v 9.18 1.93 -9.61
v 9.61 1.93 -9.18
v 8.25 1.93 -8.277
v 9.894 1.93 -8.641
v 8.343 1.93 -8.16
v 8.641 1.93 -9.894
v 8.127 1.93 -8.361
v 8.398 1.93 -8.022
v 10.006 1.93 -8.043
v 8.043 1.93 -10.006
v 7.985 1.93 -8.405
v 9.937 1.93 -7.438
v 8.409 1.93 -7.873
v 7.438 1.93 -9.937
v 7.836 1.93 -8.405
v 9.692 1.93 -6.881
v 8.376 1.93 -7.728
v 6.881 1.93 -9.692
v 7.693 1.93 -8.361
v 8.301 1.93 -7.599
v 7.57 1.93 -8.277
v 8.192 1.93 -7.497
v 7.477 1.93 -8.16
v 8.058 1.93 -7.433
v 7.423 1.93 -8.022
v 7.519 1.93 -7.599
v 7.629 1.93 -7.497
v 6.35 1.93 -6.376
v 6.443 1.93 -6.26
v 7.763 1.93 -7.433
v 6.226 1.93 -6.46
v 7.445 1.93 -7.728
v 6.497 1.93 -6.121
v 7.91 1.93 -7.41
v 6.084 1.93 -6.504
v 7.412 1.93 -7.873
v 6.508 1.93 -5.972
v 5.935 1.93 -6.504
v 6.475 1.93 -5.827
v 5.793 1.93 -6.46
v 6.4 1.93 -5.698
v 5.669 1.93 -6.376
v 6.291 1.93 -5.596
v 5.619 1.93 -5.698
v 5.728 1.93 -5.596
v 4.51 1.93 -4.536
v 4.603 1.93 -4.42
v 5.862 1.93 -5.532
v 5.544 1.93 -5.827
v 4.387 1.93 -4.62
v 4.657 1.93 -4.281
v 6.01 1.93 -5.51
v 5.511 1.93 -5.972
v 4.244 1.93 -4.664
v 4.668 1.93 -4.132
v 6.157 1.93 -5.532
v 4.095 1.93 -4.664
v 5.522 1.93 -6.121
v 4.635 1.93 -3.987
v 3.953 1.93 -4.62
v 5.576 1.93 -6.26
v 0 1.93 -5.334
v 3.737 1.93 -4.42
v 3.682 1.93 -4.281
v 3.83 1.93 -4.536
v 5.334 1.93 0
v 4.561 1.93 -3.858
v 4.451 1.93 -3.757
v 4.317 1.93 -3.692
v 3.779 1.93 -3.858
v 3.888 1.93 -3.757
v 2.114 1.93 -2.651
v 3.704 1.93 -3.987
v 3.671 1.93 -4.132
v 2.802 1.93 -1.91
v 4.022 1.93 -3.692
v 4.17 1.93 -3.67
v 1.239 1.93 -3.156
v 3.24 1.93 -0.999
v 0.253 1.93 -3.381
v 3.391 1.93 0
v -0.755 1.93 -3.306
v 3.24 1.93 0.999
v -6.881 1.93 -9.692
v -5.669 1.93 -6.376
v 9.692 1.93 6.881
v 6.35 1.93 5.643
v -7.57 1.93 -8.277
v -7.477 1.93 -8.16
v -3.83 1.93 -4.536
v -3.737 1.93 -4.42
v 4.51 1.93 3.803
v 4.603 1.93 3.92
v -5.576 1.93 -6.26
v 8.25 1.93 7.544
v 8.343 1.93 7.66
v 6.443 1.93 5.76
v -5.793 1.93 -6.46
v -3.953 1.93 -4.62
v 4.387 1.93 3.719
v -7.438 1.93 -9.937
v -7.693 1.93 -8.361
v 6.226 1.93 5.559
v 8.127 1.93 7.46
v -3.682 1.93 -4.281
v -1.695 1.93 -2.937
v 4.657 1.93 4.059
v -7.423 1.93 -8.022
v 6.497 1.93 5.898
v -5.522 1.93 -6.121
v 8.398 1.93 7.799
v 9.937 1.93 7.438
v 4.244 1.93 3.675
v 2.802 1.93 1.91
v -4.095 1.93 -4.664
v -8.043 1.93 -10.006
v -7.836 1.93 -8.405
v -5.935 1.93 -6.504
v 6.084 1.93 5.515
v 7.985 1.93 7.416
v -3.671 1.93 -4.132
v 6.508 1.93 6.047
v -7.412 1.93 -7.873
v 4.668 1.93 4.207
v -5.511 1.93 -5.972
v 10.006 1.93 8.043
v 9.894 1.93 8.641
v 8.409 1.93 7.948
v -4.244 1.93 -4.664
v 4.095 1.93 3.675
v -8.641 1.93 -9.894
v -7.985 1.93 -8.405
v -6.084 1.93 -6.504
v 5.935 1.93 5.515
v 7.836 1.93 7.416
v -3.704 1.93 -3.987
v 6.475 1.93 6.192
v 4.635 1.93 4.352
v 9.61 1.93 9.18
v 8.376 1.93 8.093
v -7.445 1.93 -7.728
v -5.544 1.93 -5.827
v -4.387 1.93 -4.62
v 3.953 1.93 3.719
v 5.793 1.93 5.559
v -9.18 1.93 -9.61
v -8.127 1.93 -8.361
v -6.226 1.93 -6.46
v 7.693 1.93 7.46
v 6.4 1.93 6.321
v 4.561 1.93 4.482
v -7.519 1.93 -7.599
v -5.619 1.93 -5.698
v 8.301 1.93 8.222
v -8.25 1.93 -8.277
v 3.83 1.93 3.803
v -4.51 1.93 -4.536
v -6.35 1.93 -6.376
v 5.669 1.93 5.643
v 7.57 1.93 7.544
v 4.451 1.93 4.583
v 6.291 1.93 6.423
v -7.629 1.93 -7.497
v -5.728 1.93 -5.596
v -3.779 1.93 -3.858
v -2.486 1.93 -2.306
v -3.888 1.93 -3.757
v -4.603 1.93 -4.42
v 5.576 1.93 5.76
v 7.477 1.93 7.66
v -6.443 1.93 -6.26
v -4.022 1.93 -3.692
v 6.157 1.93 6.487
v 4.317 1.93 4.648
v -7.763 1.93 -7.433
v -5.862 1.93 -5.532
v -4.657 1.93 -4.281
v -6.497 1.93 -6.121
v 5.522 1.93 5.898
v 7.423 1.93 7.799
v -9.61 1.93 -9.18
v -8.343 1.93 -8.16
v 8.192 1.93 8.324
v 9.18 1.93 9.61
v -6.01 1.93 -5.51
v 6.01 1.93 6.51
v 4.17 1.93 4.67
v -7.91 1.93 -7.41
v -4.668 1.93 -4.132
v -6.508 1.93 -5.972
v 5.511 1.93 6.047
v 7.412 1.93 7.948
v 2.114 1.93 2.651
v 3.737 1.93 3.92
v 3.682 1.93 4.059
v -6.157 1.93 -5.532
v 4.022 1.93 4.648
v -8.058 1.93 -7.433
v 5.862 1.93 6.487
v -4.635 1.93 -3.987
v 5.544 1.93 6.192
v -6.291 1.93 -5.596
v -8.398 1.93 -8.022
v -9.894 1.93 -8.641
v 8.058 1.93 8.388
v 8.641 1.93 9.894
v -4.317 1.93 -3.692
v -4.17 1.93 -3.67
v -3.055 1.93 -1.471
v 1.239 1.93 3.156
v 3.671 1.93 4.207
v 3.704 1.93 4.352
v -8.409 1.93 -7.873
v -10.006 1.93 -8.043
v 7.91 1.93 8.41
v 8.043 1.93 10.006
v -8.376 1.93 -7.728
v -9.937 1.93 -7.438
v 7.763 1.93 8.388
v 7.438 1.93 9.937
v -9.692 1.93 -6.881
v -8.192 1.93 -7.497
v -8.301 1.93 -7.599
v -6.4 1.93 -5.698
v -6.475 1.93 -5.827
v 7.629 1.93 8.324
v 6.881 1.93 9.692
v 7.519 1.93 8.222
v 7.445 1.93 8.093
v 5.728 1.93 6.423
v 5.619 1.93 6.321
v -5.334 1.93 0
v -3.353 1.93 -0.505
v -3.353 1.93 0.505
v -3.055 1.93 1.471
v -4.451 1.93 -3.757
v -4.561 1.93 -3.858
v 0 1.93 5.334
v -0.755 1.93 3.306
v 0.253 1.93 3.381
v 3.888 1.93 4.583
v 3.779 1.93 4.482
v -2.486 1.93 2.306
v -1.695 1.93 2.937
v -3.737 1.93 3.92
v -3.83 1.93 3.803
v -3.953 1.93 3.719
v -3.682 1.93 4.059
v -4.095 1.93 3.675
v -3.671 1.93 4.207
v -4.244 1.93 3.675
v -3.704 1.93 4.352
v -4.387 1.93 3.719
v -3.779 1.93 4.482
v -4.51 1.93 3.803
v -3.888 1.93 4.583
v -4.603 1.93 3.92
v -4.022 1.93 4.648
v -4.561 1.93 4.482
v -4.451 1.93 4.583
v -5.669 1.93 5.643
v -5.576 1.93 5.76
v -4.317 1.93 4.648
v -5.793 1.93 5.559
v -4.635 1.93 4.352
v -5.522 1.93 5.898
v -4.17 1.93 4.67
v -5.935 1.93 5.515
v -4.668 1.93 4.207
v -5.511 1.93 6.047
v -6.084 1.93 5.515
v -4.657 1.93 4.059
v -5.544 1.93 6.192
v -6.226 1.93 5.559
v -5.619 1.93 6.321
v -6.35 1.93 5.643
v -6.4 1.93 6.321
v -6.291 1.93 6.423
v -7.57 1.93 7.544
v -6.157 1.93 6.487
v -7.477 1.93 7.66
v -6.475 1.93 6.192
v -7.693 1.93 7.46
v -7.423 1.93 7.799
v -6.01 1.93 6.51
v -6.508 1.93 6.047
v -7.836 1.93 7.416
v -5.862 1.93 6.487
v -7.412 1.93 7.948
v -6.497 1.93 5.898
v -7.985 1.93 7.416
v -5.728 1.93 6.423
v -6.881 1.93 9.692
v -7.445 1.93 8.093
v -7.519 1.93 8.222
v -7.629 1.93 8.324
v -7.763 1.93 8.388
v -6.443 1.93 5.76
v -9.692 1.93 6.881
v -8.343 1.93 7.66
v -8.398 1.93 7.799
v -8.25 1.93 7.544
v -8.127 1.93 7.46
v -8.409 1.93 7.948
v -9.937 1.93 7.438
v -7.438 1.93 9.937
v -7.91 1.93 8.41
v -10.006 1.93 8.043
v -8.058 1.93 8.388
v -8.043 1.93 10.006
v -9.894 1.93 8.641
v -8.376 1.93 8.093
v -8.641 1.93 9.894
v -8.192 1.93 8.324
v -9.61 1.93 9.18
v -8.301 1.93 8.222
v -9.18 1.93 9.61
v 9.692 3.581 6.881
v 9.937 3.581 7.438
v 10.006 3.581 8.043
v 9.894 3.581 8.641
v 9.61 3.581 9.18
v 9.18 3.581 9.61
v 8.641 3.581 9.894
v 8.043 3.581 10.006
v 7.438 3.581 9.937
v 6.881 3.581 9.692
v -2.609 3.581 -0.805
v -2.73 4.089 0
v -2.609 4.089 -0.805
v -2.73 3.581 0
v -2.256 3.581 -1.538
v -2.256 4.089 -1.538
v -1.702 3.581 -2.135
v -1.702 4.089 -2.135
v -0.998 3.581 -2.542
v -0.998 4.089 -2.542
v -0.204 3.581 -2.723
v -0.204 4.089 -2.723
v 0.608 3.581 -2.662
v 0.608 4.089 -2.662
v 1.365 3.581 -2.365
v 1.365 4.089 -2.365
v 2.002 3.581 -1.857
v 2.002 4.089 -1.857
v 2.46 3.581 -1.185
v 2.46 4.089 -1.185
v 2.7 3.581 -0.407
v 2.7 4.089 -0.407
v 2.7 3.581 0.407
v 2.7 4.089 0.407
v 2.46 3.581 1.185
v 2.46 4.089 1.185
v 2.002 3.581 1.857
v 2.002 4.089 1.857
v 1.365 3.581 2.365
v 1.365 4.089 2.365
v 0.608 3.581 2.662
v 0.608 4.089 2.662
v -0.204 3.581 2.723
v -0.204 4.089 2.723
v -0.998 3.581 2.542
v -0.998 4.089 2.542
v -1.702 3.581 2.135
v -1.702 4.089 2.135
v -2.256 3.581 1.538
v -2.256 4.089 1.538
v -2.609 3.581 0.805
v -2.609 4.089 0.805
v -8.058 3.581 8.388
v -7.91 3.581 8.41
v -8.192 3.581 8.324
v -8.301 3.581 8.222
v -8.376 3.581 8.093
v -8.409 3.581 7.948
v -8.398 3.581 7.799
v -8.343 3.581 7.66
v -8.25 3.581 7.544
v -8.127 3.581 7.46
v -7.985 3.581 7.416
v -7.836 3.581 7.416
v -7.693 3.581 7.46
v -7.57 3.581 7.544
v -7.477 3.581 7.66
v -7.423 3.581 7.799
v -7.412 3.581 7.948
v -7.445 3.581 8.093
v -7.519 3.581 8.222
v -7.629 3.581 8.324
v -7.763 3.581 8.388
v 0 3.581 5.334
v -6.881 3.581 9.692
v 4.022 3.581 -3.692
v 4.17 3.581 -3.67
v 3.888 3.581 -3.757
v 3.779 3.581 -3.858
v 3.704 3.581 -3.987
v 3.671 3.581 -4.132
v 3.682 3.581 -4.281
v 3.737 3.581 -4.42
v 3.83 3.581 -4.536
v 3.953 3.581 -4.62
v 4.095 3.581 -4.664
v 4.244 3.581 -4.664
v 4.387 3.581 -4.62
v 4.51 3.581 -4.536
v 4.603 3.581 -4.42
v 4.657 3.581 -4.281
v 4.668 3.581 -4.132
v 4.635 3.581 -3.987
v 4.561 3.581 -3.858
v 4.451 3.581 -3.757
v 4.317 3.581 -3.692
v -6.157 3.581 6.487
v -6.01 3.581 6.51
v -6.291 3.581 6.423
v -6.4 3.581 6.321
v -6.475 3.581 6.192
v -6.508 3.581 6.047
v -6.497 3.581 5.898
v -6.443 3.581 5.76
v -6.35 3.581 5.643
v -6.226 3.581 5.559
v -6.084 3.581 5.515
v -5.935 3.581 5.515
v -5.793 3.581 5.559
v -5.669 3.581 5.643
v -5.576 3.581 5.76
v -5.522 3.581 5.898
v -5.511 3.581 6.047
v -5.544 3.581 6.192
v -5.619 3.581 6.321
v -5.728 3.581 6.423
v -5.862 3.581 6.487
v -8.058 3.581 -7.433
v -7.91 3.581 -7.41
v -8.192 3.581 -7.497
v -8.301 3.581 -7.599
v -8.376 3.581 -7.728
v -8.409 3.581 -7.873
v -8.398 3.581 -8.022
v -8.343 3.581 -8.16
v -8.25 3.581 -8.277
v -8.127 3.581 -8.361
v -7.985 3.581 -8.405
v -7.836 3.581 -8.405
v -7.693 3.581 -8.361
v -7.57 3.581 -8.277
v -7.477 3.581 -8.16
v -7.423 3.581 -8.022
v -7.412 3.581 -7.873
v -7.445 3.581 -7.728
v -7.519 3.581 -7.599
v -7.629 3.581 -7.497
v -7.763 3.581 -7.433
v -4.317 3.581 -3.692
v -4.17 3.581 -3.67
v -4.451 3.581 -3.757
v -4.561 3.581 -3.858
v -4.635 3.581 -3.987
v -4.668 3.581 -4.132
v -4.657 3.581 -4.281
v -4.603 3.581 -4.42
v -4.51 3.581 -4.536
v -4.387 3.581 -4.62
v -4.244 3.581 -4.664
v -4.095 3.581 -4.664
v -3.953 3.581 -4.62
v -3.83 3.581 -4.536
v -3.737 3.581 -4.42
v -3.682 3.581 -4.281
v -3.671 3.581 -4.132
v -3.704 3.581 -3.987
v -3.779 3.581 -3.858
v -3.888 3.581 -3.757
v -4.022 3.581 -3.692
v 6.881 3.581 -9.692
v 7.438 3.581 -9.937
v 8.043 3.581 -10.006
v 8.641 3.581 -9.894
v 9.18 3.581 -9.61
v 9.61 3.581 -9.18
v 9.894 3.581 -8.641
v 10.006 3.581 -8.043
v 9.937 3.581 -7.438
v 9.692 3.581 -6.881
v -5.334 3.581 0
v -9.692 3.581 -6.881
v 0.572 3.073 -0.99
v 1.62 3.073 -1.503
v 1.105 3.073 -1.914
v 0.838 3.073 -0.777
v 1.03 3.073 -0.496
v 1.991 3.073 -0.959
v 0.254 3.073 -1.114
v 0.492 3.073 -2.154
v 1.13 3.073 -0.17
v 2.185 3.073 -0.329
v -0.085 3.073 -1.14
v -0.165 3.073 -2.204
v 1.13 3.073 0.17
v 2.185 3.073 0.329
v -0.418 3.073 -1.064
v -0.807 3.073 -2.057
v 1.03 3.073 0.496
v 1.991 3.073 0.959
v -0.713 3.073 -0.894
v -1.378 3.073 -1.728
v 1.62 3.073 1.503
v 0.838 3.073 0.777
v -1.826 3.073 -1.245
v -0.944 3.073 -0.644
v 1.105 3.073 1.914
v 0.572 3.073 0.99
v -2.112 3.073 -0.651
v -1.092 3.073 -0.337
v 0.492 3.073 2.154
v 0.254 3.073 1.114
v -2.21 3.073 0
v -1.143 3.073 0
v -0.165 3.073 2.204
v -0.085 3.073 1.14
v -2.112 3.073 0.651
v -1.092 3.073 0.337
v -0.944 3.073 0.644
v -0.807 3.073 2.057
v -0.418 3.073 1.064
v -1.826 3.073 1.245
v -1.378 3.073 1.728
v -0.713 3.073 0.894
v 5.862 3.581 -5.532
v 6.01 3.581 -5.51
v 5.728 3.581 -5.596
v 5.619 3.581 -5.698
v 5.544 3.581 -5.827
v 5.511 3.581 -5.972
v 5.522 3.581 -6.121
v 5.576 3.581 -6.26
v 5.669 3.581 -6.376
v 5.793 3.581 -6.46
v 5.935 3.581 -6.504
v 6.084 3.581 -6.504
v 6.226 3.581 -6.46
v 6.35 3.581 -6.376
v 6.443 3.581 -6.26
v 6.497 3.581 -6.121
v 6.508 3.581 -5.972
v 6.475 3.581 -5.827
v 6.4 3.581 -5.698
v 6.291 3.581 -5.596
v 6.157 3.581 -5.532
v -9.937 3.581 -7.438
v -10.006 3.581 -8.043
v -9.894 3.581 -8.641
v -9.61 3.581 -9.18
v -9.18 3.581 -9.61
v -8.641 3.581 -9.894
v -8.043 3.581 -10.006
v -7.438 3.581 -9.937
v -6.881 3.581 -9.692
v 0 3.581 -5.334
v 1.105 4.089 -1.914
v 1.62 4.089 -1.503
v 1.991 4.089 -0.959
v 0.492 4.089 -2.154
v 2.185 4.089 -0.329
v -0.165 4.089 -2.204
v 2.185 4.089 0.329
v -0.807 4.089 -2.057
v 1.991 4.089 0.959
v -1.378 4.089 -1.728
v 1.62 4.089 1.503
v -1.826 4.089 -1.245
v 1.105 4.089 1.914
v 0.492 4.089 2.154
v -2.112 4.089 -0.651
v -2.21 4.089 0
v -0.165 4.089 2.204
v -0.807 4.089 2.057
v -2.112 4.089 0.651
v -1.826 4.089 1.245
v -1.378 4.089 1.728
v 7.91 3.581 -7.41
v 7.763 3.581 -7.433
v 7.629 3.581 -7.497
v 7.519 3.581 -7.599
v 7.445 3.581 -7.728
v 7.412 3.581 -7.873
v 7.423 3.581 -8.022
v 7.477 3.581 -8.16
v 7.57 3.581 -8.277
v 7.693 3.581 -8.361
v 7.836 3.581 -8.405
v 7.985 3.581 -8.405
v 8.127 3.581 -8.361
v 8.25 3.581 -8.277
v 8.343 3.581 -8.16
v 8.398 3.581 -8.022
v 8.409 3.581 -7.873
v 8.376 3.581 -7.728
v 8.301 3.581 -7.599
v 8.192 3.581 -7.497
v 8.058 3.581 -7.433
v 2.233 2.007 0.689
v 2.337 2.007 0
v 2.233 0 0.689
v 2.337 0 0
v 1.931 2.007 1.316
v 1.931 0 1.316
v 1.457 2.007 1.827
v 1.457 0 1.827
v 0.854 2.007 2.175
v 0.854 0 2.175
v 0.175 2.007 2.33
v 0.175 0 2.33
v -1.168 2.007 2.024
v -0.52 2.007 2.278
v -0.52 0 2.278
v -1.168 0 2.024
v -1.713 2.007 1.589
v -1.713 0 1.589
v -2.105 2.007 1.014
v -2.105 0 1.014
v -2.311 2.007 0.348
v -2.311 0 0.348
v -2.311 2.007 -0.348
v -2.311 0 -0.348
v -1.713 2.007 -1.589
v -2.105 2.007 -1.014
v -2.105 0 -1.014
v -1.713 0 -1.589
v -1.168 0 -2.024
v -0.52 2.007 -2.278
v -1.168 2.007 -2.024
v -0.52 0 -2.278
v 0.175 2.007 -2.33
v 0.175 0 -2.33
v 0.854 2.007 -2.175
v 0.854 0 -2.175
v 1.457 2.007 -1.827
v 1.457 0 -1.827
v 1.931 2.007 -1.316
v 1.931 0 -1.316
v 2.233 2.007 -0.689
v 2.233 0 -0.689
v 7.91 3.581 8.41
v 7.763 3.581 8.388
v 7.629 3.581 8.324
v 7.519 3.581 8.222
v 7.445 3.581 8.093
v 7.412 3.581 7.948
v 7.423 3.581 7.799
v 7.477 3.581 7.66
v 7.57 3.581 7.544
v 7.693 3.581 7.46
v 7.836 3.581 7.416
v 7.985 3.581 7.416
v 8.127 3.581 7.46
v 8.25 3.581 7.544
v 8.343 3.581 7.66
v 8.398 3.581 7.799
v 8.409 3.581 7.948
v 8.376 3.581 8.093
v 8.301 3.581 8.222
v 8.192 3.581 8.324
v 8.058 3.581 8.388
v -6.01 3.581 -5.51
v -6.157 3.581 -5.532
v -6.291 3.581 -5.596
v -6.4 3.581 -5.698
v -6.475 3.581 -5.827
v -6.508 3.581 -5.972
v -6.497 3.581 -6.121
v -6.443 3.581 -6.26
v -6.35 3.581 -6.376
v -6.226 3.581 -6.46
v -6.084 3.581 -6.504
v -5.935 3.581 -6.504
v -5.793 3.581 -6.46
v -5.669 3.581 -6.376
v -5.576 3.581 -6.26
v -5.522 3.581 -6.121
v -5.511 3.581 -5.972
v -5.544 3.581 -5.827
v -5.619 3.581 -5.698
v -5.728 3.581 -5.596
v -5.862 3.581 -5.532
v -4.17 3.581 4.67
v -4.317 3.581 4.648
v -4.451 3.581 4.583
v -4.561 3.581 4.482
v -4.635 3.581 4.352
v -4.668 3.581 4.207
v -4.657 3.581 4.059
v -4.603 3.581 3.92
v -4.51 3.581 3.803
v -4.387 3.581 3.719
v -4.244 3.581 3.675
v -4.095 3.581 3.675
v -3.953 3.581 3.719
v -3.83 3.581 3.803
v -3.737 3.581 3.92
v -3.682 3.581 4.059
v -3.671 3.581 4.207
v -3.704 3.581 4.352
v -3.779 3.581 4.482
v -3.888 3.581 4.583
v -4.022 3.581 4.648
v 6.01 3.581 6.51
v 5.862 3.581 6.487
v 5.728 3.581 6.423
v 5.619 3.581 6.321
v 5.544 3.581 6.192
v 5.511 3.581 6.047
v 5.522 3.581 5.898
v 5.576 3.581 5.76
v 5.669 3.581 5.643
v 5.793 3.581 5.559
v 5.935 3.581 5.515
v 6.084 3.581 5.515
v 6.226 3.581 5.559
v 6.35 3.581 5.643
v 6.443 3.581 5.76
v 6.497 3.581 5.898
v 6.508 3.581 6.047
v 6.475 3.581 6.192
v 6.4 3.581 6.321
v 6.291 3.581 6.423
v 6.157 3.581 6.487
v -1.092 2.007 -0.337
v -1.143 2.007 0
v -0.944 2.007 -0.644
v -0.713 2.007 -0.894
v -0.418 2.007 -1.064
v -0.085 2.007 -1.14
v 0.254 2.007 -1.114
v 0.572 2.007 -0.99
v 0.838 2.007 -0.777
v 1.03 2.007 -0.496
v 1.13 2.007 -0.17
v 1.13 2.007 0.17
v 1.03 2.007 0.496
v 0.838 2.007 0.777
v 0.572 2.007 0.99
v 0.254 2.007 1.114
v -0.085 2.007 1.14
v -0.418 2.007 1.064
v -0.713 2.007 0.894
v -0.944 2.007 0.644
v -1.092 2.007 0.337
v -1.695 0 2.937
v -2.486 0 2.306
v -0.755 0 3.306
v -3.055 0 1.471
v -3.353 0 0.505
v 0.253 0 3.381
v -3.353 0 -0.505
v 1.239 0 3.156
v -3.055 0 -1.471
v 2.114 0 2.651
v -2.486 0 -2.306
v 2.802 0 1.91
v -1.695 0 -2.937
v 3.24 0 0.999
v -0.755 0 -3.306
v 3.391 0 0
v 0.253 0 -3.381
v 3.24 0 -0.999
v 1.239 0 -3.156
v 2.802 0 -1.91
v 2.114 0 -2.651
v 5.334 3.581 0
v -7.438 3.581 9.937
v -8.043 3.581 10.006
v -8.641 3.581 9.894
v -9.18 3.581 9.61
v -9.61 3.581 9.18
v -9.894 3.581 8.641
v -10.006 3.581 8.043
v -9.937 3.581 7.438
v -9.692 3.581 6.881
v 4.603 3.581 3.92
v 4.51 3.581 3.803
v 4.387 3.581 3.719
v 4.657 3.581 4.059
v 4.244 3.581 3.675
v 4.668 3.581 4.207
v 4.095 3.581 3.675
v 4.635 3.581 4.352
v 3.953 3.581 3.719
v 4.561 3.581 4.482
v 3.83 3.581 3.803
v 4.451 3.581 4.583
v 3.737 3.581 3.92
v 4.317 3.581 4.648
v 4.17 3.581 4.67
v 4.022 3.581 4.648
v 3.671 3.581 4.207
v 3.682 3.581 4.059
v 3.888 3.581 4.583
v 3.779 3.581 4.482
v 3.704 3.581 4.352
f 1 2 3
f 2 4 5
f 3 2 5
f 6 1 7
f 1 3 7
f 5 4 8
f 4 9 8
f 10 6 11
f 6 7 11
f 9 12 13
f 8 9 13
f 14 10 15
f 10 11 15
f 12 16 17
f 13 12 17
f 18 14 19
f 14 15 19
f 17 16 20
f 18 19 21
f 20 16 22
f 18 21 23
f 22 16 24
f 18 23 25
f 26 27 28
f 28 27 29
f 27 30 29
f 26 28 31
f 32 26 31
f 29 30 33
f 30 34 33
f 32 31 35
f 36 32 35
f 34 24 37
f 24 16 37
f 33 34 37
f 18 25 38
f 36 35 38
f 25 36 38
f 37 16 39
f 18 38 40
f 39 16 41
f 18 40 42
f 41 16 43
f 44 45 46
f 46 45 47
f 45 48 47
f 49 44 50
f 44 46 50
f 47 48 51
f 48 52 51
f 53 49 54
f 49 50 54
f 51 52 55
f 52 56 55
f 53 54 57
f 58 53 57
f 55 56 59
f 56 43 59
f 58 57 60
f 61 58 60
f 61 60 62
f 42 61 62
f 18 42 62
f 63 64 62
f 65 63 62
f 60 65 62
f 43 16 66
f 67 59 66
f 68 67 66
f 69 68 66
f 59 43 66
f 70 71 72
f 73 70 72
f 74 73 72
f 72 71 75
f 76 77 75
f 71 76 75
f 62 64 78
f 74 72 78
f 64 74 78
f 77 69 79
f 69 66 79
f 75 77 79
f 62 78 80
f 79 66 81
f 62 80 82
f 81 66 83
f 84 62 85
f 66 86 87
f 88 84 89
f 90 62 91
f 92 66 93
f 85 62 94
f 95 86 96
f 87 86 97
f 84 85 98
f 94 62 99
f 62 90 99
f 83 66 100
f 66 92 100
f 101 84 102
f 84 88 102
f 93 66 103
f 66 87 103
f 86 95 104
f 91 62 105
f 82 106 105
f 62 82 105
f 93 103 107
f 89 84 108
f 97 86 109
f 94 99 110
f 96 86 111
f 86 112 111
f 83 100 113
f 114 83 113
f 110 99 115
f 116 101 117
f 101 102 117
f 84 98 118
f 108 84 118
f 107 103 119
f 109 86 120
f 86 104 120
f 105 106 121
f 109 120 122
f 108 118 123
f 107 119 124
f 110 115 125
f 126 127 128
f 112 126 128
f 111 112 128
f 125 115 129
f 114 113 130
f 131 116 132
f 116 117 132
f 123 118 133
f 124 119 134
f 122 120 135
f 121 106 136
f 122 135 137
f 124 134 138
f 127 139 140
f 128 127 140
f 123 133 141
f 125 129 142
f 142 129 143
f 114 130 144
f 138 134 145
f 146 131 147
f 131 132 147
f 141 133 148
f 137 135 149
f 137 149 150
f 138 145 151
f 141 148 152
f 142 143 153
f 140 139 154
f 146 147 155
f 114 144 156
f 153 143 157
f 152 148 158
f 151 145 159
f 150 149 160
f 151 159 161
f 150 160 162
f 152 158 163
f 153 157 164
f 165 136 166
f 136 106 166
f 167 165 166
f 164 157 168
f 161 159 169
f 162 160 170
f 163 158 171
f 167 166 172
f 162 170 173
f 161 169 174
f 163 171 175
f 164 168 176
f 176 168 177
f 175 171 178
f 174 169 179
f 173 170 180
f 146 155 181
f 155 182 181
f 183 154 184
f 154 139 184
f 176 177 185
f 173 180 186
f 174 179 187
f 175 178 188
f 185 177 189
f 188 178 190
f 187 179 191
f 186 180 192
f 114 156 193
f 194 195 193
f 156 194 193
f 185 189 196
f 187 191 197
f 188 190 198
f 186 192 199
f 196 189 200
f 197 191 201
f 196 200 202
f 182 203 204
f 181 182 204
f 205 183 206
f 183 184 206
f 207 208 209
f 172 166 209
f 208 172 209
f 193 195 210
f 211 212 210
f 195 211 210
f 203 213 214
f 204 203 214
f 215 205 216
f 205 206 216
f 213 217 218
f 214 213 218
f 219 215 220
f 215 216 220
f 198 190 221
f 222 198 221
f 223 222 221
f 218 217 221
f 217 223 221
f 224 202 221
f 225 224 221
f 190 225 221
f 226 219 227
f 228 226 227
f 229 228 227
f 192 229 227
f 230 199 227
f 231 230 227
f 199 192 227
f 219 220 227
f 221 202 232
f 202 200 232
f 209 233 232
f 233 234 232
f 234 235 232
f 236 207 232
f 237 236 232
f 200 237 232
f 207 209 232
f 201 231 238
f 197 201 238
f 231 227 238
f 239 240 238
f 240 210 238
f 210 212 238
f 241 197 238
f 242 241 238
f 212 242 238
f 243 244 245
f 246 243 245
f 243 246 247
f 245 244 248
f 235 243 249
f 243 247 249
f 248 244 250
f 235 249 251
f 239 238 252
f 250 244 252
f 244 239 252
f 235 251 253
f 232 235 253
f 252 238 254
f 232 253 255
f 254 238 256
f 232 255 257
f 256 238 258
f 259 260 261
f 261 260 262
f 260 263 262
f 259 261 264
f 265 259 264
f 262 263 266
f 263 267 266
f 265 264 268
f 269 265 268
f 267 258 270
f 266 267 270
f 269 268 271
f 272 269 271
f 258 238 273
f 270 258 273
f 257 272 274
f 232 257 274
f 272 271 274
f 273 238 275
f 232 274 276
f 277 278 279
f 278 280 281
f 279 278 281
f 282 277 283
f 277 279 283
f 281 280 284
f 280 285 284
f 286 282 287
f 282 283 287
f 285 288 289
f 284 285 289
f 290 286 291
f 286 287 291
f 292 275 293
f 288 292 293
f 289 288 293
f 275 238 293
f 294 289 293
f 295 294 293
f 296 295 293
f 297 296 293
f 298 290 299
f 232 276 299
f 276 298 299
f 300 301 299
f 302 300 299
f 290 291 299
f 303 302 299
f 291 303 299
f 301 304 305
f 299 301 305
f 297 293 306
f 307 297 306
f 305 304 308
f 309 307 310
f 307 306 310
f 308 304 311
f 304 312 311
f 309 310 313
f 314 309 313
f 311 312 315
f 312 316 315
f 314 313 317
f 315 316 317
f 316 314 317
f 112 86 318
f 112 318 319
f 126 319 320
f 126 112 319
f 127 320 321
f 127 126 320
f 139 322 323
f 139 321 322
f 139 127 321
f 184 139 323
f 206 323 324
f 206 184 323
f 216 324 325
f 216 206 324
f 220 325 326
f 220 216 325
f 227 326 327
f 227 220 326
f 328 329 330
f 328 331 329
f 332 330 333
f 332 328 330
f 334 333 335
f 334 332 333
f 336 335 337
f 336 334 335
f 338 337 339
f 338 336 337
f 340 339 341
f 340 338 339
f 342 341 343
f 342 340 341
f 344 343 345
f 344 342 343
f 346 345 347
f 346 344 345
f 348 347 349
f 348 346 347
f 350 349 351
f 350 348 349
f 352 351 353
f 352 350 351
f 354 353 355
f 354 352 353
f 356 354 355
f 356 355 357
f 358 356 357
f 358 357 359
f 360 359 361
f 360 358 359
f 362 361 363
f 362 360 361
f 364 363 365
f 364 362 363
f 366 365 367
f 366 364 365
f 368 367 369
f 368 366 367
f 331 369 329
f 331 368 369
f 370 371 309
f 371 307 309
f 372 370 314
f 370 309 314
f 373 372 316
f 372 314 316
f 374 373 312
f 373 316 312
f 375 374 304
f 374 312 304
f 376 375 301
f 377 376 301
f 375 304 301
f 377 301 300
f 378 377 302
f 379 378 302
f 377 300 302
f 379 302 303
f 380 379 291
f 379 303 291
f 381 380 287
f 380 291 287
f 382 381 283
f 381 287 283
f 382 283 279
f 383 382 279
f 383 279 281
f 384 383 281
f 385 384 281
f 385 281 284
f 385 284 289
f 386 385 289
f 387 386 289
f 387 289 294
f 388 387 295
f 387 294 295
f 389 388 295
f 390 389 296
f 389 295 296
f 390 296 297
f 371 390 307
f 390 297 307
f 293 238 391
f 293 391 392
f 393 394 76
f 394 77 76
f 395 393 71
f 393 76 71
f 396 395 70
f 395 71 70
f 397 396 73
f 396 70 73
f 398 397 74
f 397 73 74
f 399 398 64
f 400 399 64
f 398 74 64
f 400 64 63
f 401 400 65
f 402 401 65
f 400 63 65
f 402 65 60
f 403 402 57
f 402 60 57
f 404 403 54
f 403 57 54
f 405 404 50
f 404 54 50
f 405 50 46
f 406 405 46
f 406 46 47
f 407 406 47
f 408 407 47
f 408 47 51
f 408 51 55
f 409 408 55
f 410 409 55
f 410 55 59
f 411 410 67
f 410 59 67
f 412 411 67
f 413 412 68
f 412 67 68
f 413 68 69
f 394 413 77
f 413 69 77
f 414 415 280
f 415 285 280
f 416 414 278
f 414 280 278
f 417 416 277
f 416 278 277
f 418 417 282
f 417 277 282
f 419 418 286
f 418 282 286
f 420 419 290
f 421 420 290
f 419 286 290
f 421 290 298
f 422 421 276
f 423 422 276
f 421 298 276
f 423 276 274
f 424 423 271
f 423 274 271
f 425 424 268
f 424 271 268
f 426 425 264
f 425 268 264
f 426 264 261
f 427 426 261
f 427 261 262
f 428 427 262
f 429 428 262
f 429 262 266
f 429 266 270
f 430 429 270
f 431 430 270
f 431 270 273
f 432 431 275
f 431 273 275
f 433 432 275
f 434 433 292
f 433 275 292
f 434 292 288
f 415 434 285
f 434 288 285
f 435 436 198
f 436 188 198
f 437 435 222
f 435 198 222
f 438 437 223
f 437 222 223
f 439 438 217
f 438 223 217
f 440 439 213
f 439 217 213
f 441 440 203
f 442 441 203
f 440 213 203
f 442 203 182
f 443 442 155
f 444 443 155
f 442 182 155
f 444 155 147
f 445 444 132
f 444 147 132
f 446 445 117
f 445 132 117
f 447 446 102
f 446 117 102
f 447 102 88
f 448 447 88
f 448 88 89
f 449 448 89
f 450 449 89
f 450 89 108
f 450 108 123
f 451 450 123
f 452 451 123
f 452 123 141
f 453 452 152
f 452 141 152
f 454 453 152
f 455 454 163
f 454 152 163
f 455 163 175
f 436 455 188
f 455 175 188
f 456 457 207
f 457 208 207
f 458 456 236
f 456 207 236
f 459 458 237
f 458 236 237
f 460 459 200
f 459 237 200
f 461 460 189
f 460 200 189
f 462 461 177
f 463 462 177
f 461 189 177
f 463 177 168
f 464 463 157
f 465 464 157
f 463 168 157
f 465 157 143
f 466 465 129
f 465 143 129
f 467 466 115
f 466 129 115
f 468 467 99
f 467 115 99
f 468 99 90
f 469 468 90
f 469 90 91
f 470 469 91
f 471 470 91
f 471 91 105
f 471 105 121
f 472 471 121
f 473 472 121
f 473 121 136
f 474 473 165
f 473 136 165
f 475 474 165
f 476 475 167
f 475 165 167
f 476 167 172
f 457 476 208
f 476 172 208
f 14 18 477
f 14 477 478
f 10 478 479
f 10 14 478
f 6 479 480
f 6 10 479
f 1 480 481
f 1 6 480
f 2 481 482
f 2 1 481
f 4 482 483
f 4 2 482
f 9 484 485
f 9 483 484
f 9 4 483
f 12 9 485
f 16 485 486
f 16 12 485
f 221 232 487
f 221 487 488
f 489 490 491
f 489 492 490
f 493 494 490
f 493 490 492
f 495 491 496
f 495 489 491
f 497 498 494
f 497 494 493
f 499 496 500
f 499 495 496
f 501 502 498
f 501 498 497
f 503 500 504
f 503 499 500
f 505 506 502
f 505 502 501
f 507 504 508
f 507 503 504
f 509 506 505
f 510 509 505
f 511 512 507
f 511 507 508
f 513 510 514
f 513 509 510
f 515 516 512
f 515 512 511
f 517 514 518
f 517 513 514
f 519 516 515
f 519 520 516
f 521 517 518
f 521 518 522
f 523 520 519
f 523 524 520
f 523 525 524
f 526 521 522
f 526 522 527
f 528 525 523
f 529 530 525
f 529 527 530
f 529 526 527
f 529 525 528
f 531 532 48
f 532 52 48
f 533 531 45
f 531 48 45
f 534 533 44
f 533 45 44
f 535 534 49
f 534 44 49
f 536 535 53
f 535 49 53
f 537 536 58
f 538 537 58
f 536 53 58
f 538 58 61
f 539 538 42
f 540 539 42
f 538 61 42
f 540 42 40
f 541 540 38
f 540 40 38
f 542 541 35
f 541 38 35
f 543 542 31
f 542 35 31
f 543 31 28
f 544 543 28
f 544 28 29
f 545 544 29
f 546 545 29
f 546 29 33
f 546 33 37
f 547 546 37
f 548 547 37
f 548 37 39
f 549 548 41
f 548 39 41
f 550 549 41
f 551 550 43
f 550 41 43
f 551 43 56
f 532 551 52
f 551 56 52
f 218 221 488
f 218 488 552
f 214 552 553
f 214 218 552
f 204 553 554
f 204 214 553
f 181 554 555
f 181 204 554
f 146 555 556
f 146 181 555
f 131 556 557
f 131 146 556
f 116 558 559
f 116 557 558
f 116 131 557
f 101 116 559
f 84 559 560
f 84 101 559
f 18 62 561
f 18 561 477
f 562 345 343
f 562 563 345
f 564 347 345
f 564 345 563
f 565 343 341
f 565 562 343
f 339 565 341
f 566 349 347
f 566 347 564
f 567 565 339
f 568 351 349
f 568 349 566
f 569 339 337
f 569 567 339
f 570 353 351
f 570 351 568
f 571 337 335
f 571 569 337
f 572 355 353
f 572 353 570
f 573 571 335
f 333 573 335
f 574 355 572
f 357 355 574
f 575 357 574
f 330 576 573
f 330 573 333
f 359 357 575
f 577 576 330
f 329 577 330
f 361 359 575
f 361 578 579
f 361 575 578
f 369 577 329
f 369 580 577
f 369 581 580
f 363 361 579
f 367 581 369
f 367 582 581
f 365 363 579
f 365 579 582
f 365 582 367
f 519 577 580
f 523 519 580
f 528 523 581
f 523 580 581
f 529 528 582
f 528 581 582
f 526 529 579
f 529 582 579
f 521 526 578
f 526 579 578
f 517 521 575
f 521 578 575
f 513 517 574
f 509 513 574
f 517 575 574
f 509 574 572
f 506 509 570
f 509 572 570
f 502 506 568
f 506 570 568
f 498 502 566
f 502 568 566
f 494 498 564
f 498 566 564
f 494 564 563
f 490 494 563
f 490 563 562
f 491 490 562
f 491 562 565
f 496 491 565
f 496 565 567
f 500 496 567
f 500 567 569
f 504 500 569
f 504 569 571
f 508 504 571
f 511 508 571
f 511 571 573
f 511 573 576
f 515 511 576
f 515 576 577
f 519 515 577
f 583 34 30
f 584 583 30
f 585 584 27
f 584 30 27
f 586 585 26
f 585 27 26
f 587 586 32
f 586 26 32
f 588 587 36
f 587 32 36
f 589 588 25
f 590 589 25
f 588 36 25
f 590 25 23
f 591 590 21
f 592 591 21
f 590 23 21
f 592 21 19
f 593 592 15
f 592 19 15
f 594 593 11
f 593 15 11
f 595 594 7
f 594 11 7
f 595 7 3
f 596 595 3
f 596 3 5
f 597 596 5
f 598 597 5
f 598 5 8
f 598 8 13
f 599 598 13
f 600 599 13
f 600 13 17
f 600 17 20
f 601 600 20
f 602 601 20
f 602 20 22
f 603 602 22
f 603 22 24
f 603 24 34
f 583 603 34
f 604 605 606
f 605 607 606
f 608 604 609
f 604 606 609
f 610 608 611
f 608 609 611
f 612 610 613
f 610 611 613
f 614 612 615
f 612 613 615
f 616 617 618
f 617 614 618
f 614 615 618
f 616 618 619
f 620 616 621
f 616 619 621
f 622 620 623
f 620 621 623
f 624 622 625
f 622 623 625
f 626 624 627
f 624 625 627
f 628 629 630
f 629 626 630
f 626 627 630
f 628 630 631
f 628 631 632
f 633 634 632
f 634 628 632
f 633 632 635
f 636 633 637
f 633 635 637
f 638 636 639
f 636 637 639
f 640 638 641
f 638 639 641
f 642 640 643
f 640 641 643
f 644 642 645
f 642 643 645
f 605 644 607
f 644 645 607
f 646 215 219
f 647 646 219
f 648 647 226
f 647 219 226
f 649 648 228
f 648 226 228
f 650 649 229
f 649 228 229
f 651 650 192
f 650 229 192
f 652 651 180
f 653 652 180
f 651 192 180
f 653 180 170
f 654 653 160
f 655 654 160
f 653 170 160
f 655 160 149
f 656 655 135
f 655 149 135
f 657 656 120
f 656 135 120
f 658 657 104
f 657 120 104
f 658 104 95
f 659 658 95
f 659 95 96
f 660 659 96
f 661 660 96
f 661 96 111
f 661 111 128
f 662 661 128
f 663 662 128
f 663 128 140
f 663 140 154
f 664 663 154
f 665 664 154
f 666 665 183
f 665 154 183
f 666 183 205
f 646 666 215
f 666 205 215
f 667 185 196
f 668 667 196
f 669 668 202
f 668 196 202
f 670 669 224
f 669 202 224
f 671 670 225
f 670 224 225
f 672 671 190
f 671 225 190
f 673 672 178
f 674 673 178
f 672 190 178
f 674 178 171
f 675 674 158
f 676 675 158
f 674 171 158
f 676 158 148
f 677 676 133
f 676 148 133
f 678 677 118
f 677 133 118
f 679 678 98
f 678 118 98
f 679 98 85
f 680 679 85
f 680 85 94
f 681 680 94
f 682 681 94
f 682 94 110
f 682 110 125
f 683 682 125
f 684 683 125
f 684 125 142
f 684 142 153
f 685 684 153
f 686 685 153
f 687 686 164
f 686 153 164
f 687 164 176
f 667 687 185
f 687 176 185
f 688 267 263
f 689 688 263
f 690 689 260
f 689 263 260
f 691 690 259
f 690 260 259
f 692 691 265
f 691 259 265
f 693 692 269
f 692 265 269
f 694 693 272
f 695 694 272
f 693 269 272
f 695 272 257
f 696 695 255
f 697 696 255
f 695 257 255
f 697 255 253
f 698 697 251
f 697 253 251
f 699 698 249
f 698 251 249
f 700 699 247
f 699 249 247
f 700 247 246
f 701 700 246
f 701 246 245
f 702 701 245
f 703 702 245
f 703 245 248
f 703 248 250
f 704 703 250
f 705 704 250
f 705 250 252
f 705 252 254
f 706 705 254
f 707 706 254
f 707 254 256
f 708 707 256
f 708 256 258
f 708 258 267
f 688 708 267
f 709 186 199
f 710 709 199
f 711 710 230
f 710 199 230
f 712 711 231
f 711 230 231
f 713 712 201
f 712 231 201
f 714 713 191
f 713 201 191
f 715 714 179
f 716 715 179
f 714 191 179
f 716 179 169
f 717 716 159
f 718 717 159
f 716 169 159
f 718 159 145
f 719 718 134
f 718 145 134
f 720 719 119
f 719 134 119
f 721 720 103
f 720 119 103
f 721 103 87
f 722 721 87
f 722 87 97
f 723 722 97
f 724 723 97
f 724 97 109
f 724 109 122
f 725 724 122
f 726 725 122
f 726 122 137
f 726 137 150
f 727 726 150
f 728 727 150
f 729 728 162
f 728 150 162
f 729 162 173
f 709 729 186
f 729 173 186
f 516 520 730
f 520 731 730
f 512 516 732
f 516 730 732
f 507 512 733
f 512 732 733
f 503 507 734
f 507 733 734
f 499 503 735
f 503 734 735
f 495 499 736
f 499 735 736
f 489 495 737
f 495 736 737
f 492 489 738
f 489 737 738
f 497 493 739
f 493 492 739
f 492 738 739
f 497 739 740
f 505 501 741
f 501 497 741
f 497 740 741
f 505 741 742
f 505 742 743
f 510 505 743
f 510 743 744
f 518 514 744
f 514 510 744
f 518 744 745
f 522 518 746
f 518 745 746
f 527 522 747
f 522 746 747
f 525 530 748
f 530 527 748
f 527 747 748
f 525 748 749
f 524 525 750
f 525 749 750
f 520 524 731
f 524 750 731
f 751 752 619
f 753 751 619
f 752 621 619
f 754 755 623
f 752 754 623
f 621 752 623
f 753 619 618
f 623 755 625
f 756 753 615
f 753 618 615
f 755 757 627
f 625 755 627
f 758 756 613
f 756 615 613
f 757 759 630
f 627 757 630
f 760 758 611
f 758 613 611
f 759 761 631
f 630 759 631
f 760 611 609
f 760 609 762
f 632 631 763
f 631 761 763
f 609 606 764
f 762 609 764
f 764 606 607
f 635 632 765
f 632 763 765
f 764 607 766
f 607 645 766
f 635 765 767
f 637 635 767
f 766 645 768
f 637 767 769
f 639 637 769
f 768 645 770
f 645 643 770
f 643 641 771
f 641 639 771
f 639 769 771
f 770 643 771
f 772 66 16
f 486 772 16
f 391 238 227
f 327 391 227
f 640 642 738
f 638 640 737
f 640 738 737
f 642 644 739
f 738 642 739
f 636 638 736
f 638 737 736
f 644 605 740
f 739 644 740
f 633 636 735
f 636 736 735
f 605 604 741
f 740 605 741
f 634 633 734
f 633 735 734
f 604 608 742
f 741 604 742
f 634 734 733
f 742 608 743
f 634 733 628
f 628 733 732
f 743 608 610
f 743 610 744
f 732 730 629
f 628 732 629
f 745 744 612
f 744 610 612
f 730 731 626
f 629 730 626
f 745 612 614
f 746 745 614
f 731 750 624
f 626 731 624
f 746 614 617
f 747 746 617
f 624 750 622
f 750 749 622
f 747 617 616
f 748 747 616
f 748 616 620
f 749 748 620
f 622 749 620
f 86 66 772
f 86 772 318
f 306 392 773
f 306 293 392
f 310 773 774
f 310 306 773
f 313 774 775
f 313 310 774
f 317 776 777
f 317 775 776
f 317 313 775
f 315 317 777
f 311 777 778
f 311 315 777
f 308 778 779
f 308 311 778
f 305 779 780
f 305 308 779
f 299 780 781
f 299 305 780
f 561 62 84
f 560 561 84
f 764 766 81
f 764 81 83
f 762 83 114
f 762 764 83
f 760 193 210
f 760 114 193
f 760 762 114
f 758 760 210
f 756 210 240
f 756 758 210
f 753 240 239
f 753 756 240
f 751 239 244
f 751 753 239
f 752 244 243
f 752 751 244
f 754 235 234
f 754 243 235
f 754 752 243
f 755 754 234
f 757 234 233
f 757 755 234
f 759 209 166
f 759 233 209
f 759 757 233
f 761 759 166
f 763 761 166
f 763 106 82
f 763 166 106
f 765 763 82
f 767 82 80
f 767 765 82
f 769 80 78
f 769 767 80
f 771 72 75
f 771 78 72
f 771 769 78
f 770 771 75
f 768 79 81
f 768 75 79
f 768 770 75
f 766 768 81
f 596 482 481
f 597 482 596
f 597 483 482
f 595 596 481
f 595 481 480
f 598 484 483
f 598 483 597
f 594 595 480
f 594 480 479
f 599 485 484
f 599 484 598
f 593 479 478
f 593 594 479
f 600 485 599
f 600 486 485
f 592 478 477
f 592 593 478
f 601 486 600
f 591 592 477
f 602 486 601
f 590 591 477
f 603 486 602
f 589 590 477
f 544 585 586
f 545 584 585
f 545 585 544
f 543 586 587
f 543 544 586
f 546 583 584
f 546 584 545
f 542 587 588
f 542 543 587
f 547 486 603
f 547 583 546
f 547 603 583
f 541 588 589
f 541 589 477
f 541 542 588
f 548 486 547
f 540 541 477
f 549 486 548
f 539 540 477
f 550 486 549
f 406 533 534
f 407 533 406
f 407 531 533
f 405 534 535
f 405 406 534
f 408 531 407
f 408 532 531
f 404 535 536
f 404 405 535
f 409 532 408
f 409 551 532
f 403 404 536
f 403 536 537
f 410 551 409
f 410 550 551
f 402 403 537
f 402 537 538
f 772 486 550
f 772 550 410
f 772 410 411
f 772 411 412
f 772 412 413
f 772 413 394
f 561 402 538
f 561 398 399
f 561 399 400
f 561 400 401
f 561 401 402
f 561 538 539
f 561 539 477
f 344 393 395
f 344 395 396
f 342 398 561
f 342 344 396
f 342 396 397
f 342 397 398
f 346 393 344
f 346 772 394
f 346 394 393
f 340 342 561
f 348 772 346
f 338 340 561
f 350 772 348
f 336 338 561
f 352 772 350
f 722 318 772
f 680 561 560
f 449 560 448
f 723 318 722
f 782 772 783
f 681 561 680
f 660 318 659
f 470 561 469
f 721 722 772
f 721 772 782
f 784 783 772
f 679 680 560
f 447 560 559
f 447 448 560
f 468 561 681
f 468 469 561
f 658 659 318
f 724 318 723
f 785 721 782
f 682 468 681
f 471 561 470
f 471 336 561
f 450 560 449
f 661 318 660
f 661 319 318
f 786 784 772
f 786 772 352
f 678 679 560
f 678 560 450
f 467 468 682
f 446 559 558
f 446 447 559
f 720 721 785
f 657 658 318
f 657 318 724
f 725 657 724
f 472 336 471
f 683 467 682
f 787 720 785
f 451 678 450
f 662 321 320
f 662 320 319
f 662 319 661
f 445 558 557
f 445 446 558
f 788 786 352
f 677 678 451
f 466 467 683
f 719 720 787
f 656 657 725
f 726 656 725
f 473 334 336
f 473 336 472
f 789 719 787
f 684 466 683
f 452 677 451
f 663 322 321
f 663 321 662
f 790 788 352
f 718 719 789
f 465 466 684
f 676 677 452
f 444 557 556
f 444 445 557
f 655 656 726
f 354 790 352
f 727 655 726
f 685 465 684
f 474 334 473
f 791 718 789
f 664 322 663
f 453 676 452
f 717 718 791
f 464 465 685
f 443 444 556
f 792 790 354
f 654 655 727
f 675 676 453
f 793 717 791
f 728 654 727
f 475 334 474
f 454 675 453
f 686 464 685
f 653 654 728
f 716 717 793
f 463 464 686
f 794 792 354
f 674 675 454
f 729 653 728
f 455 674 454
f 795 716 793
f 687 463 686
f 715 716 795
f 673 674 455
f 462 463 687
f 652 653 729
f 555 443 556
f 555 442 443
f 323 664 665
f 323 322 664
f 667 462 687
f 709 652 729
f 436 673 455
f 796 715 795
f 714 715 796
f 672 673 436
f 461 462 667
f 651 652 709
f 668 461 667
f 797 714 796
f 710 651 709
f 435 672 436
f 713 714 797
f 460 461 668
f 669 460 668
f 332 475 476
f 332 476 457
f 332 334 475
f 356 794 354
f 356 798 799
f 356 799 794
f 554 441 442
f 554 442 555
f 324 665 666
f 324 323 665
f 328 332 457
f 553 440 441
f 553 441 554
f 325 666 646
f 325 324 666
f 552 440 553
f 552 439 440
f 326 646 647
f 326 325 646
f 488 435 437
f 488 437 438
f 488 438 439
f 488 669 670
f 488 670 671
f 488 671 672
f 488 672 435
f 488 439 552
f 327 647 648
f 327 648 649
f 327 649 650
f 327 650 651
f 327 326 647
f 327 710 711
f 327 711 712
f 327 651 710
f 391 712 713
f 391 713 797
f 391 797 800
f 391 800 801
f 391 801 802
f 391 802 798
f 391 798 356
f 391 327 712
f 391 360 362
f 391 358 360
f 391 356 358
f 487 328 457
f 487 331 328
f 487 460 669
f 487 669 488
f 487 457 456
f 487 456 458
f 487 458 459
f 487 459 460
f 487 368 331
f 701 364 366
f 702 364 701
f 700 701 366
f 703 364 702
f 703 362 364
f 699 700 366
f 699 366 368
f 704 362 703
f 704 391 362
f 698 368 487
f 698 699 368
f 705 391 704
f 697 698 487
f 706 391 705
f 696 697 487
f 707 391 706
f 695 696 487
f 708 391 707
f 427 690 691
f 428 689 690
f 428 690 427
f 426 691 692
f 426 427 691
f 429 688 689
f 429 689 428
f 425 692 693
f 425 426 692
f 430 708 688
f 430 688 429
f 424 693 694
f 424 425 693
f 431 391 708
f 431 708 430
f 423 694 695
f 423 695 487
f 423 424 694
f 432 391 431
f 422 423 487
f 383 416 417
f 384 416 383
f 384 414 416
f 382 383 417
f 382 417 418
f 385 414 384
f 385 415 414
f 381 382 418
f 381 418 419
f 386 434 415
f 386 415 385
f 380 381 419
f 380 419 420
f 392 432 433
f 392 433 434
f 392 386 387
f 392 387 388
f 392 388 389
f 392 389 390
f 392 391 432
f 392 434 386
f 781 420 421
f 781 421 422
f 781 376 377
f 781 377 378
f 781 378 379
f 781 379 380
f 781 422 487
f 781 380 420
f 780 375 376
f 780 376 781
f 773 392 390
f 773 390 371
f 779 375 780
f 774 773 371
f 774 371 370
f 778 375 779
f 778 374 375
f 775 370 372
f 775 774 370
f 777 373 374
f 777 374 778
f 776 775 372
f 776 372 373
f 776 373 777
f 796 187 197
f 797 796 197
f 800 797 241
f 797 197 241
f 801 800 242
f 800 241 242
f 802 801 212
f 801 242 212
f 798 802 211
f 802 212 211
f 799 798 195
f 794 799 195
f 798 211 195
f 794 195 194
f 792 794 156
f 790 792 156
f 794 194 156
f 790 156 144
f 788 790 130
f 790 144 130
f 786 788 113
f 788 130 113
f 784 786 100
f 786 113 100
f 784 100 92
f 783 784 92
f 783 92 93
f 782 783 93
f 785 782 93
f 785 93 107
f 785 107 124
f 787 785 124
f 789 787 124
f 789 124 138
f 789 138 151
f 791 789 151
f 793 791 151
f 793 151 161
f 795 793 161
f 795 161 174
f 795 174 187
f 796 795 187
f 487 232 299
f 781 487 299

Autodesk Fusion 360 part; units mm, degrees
sketch "Sketch1" plane through (0, 0, 0) normal (0, 1, 0) x (1, 0, 0)
  circle A0 centre (0, 0) radius 3.3909
  circle A1 centre (0, 0) radius 2.3368
  dimension "d1" = 6.7818
  dimension "d2" = 4.6736
extrude "Extrude1" add sketch "Sketch1" along normal blind 1.9304
sketch "Sketch2" plane through (0, 1.9304, 0) normal (0, 1, 0) x (-1, 0, 0)
  circle A0 centre (0, 0) radius 2.3368
  circle A1 centre (0, 0) radius 3.3909
  line L0 (-10.0076, 10.0076) -> (10.0076, 10.0076) construction
  line L1 (10.0076, 10.0076) -> (10.0076, -10.0076) construction
  line L2 (10.0076, -10.0076) -> (-10.0076, -10.0076) construction
  line L3 (-10.0076, -10.0076) -> (-10.0076, 10.0076) construction
  line L4 (-10.0076, 10.0076) -> (10.0076, -10.0076) construction
  line L5 (10.0076, 10.0076) -> (-10.0076, -10.0076) construction
  circle A2 centre (7.9709, -7.9709) radius 2.0367 construction
  circle A3 centre (-7.9709, -7.9709) radius 2.0367 construction
  circle A4 centre (-7.9709, 7.9709) radius 2.0367 construction
  circle A5 centre (7.9709, 7.9709) radius 2.0367 construction
  circle A6 centre (0, 0) radius 5.334 construction
  circle A7 centre (7.9709, -7.9709) radius 0.5
  circle A8 centre (-7.9709, -7.9709) radius 0.5
  circle A9 centre (7.9709, 7.9709) radius 0.5
  circle A10 centre (-7.9709, 7.9709) radius 0.5
  line L6 (8.4709, -7.9709) -> (-8.4709, -7.9709) construction
  line L7 (0, -5.334) -> (0, 5.334) construction
  line L8 (5.334, 0) -> (-5.334, 0) construction
  line L9 (9.4111, -6.5307) -> (6.5307, -9.4111) construction
  line L10 (-6.5307, -9.4111) -> (-9.4111, -6.5307) construction
  line L11 (-9.4111, 6.5307) -> (-6.5307, 9.4111) construction
  line L12 (9.4111, 6.5307) -> (6.5307, 9.4111) construction
  line L13 (5.334, 0) -> (9.6916, -6.8813)
  line L14 (5.334, 0) -> (9.6916, 6.8813)
  line L15 (0, 5.334) -> (6.8813, 9.6916)
  line L16 (0, 5.334) -> (-6.8813, 9.6916)
  line L17 (-5.334, 0) -> (-9.6916, 6.8813)
  line L18 (-5.334, 0) -> (-9.6916, -6.8813)
  line L19 (0, -5.334) -> (-6.8813, -9.6916)
  line L20 (0, -5.334) -> (6.8813, -9.6916)
  arc A11 (6.8813, -9.6916) -> (9.6916, -6.8813) centre (7.9709, -7.9709) ccw
  arc A12 (-9.6916, -6.8813) -> (-6.8813, -9.6916) centre (-7.9709, -7.9709) ccw
  arc A13 (-6.8813, 9.6916) -> (-9.6916, 6.8813) centre (-7.9709, 7.9709) ccw
  arc A14 (9.6916, 6.8813) -> (6.8813, 9.6916) centre (7.9709, 7.9709) ccw
  circle A15 centre (0, 0) radius 1.143
  dimension "d5" = 20.0152
  dimension "d6" = 20.0152
  dimension "d7" = 10.668
  dimension "d8" = 1
  dimension "d9" = 16.9418
  dimension "d10" = 2.286
extrude "Extrude2" add sketch "Sketch2" along normal blind 1.651 contours A0 | A1 | A7 | A8 | A9 | A10 | L13 L14 L15 L16 L17 L18 L19 L20 A11 A12 A13 A14
sketch "Sketch3" plane through (0, 3.5814, 0) normal (0, 1, 0) x (-1, 0, 0)
  circle A0 centre (0, 0) radius 1.143
  line L0 (5.334, 0) -> (9.6916, 6.8813)
  arc A1 (9.6916, 6.8813) -> (6.8813, 9.6916) centre (7.9709, 7.9709) ccw
  line L1 (6.8813, 9.6916) -> (0, 5.334)
  line L2 (0, 5.334) -> (-6.8813, 9.6916)
  arc A2 (-6.8813, 9.6916) -> (-9.6916, 6.8813) centre (-7.9709, 7.9709) ccw
  line L3 (-9.6916, 6.8813) -> (-5.334, 0)
  line L4 (-5.334, 0) -> (-9.6916, -6.8813)
  arc A3 (-9.6916, -6.8813) -> (-6.8813, -9.6916) centre (-7.9709, -7.9709) ccw
  line L5 (-6.8813, -9.6916) -> (0, -5.334)
  line L6 (0, -5.334) -> (6.8813, -9.6916)
  arc A4 (6.8813, -9.6916) -> (9.6916, -6.8813) centre (7.9709, -7.9709) ccw
  line L7 (9.6916, -6.8813) -> (5.334, 0)
  line L8 (-10.0076, 10.0076) -> (10.0076, 10.0076) construction
  line L9 (10.0076, 10.0076) -> (10.0076, -10.0076) construction
  line L10 (10.0076, -10.0076) -> (-10.0076, -10.0076) construction
  line L11 (-10.0076, -10.0076) -> (-10.0076, 10.0076) construction
  line L12 (-10.0076, 10.0076) -> (10.0076, -10.0076) construction
  line L13 (10.0076, 10.0076) -> (-10.0076, -10.0076) construction
  line L14 (8.2888, -8.2888) -> (-8.2888, 8.2888) construction
  line L15 (-8.2888, -8.2888) -> (8.2888, 8.2888) construction
  line L16 (-8.4455, 8.4455) -> (8.4455, 8.4455) construction
  line L17 (8.4455, 8.4455) -> (8.4455, -8.4455) construction
  line L18 (8.4455, -8.4455) -> (-8.4455, -8.4455) construction
  line L19 (-8.4455, -8.4455) -> (-8.4455, 8.4455) construction
  line L20 (-8.4455, 8.4455) -> (8.4455, -8.4455) construction
  line L21 (8.4455, 8.4455) -> (-8.4455, -8.4455) construction
  circle A5 centre (7.9104, -7.9104) radius 0.5351
  circle A6 centre (-7.9104, -7.9104) radius 0.5351
  circle A7 centre (-7.9104, 7.9104) radius 0.5351
  circle A8 centre (7.9104, 7.9104) radius 0.5351
  line L22 (-6.376, 6.376) -> (6.376, 6.376) construction
  line L23 (6.376, 6.376) -> (6.376, -6.376) construction
  line L24 (6.376, -6.376) -> (-6.376, -6.376) construction
  line L25 (-6.376, -6.376) -> (-6.376, 6.376) construction
  line L26 (-6.376, 6.376) -> (6.376, -6.376) construction
  line L27 (6.376, 6.376) -> (-6.376, -6.376) construction
  line L28 (-6.5278, 6.5278) -> (6.5278, 6.5278) construction
  line L29 (6.5278, 6.5278) -> (6.5278, -6.5278) construction
  line L30 (6.5278, -6.5278) -> (-6.5278, -6.5278) construction
  line L31 (-6.5278, -6.5278) -> (-6.5278, 6.5278) construction
  line L32 (-6.5278, 6.5278) -> (6.5278, -6.5278) construction
  line L33 (6.5278, 6.5278) -> (-6.5278, -6.5278) construction
  circle A9 centre (6.0095, -6.0095) radius 0.5183
  circle A10 centre (-6.0095, -6.0095) radius 0.5183
  circle A11 centre (-6.0095, 6.0095) radius 0.5183
  circle A12 centre (6.0095, 6.0095) radius 0.5183
  line L34 (-4.826, -4.826) -> (4.826, -4.826) construction
  line L35 (4.826, -4.826) -> (4.826, 4.826) construction
  line L36 (4.826, 4.826) -> (-4.826, 4.826) construction
  line L37 (-4.826, 4.826) -> (-4.826, -4.826) construction
  line L38 (-4.826, -4.826) -> (4.826, 4.826) construction
  line L39 (4.826, -4.826) -> (-4.826, 4.826) construction
  line L40 (-4.6338, -4.6338) -> (4.6338, -4.6338) construction
  line L41 (4.6338, -4.6338) -> (4.6338, 4.6338) construction
  line L42 (4.6338, 4.6338) -> (-4.6338, 4.6338) construction
  line L43 (-4.6338, 4.6338) -> (-4.6338, -4.6338) construction
  line L44 (-4.6338, -4.6338) -> (4.6338, 4.6338) construction
  line L45 (4.6338, -4.6338) -> (-4.6338, 4.6338) construction
  circle A13 centre (4.1698, -4.1698) radius 0.6562
  circle A14 centre (-4.1698, -4.1698) radius 0.6562
  circle A15 centre (-4.1698, 4.1698) radius 0.6562
  circle A16 centre (4.1698, 4.1698) radius 0.6562
  dimension "d13" = 23.4442
  dimension "d14" = 16.891
  dimension "d15" = 16.891
  dimension "d16" = 18.034
  dimension "d17" = 13.0556
  dimension "d18" = 13.1064
  dimension "d19" = 9.652
hole "Hole1" at (-7.9104, 3.5814, -7.9104) at (-6.0095, 3.5814, -6.0095) at (-4.1698, 3.5814, -4.1698) at (-7.9104, 3.5814, 7.9104) at (-6.0095, 3.5814, 6.0095) at (-4.1698, 3.5814, 4.1698) at (7.9104, 3.5814, 7.9104) at (6.0095, 3.5814, 6.0095) at (4.1698, 3.5814, 4.1698) at (7.9104, 3.5814, -7.9104) at (6.0095, 3.5814, -6.0095) at (4.1698, 3.5814, -4.1698) direction (0, -1, 0) diameter 1 end through all
sketch "Sketch4" plane through (0, 3.5814, 0) normal (0, 1, 0) x (-1, 0, 0)
  circle A0 centre (-6.0095, -6.0095) radius 0.5
  circle A1 centre (-4.1698, 4.1698) radius 0.5
  circle A2 centre (-7.9104, 7.9104) radius 0.5
  circle A3 centre (6.0095, 6.0095) radius 0.5
  circle A4 centre (4.1698, -4.1698) radius 0.5
  circle A5 centre (7.9104, -7.9104) radius 0.5
  circle A6 centre (6.0095, -6.0095) radius 0.5
  circle A7 centre (7.9104, 7.9104) radius 0.5
  circle A8 centre (4.1698, 4.1698) radius 0.5
  circle A9 centre (-6.0095, 6.0095) radius 0.5
  circle A10 centre (-7.9104, -7.9104) radius 0.5
  circle A11 centre (-4.1698, -4.1698) radius 0.5
  circle A12 centre (0, 0) radius 1.143
  line L0 (5.334, 0) -> (9.6916, 6.8813)
  arc A13 (9.6916, 6.8813) -> (6.8813, 9.6916) centre (7.9709, 7.9709) ccw
  line L1 (6.8813, 9.6916) -> (0, 5.334)
  line L2 (0, 5.334) -> (-6.8813, 9.6916)
  arc A14 (-6.8813, 9.6916) -> (-9.6916, 6.8813) centre (-7.9709, 7.9709) ccw
  line L3 (-9.6916, 6.8813) -> (-5.334, 0)
  line L4 (-5.334, 0) -> (-9.6916, -6.8813)
  arc A15 (-9.6916, -6.8813) -> (-6.8813, -9.6916) centre (-7.9709, -7.9709) ccw
  line L5 (-6.8813, -9.6916) -> (0, -5.334)
  line L6 (0, -5.334) -> (6.8813, -9.6916)
  arc A16 (6.8813, -9.6916) -> (9.6916, -6.8813) centre (7.9709, -7.9709) ccw
  line L7 (9.6916, -6.8813) -> (5.334, 0)
  circle A17 centre (0, 0) radius 2.7305
  circle A18 centre (0, 0) radius 2.2098
  dimension "d22" = 5.461
  dimension "d23" = 4.4196
extrude "Extrude3" add sketch "Sketch4" along normal blind 0.508 contours A17
extrude "Extrude4" cut 1 faces at (-1.8417, 3.5814, -0.1666) along direction (0, -1, 0) blind 1.016 from surface at -0.508
extrude "Extrude5" cut 1 faces at (1.9259, 1.9304, 0.1729) along direction (0, 1, 0) blind 2.0066 from surface at -1.9304
